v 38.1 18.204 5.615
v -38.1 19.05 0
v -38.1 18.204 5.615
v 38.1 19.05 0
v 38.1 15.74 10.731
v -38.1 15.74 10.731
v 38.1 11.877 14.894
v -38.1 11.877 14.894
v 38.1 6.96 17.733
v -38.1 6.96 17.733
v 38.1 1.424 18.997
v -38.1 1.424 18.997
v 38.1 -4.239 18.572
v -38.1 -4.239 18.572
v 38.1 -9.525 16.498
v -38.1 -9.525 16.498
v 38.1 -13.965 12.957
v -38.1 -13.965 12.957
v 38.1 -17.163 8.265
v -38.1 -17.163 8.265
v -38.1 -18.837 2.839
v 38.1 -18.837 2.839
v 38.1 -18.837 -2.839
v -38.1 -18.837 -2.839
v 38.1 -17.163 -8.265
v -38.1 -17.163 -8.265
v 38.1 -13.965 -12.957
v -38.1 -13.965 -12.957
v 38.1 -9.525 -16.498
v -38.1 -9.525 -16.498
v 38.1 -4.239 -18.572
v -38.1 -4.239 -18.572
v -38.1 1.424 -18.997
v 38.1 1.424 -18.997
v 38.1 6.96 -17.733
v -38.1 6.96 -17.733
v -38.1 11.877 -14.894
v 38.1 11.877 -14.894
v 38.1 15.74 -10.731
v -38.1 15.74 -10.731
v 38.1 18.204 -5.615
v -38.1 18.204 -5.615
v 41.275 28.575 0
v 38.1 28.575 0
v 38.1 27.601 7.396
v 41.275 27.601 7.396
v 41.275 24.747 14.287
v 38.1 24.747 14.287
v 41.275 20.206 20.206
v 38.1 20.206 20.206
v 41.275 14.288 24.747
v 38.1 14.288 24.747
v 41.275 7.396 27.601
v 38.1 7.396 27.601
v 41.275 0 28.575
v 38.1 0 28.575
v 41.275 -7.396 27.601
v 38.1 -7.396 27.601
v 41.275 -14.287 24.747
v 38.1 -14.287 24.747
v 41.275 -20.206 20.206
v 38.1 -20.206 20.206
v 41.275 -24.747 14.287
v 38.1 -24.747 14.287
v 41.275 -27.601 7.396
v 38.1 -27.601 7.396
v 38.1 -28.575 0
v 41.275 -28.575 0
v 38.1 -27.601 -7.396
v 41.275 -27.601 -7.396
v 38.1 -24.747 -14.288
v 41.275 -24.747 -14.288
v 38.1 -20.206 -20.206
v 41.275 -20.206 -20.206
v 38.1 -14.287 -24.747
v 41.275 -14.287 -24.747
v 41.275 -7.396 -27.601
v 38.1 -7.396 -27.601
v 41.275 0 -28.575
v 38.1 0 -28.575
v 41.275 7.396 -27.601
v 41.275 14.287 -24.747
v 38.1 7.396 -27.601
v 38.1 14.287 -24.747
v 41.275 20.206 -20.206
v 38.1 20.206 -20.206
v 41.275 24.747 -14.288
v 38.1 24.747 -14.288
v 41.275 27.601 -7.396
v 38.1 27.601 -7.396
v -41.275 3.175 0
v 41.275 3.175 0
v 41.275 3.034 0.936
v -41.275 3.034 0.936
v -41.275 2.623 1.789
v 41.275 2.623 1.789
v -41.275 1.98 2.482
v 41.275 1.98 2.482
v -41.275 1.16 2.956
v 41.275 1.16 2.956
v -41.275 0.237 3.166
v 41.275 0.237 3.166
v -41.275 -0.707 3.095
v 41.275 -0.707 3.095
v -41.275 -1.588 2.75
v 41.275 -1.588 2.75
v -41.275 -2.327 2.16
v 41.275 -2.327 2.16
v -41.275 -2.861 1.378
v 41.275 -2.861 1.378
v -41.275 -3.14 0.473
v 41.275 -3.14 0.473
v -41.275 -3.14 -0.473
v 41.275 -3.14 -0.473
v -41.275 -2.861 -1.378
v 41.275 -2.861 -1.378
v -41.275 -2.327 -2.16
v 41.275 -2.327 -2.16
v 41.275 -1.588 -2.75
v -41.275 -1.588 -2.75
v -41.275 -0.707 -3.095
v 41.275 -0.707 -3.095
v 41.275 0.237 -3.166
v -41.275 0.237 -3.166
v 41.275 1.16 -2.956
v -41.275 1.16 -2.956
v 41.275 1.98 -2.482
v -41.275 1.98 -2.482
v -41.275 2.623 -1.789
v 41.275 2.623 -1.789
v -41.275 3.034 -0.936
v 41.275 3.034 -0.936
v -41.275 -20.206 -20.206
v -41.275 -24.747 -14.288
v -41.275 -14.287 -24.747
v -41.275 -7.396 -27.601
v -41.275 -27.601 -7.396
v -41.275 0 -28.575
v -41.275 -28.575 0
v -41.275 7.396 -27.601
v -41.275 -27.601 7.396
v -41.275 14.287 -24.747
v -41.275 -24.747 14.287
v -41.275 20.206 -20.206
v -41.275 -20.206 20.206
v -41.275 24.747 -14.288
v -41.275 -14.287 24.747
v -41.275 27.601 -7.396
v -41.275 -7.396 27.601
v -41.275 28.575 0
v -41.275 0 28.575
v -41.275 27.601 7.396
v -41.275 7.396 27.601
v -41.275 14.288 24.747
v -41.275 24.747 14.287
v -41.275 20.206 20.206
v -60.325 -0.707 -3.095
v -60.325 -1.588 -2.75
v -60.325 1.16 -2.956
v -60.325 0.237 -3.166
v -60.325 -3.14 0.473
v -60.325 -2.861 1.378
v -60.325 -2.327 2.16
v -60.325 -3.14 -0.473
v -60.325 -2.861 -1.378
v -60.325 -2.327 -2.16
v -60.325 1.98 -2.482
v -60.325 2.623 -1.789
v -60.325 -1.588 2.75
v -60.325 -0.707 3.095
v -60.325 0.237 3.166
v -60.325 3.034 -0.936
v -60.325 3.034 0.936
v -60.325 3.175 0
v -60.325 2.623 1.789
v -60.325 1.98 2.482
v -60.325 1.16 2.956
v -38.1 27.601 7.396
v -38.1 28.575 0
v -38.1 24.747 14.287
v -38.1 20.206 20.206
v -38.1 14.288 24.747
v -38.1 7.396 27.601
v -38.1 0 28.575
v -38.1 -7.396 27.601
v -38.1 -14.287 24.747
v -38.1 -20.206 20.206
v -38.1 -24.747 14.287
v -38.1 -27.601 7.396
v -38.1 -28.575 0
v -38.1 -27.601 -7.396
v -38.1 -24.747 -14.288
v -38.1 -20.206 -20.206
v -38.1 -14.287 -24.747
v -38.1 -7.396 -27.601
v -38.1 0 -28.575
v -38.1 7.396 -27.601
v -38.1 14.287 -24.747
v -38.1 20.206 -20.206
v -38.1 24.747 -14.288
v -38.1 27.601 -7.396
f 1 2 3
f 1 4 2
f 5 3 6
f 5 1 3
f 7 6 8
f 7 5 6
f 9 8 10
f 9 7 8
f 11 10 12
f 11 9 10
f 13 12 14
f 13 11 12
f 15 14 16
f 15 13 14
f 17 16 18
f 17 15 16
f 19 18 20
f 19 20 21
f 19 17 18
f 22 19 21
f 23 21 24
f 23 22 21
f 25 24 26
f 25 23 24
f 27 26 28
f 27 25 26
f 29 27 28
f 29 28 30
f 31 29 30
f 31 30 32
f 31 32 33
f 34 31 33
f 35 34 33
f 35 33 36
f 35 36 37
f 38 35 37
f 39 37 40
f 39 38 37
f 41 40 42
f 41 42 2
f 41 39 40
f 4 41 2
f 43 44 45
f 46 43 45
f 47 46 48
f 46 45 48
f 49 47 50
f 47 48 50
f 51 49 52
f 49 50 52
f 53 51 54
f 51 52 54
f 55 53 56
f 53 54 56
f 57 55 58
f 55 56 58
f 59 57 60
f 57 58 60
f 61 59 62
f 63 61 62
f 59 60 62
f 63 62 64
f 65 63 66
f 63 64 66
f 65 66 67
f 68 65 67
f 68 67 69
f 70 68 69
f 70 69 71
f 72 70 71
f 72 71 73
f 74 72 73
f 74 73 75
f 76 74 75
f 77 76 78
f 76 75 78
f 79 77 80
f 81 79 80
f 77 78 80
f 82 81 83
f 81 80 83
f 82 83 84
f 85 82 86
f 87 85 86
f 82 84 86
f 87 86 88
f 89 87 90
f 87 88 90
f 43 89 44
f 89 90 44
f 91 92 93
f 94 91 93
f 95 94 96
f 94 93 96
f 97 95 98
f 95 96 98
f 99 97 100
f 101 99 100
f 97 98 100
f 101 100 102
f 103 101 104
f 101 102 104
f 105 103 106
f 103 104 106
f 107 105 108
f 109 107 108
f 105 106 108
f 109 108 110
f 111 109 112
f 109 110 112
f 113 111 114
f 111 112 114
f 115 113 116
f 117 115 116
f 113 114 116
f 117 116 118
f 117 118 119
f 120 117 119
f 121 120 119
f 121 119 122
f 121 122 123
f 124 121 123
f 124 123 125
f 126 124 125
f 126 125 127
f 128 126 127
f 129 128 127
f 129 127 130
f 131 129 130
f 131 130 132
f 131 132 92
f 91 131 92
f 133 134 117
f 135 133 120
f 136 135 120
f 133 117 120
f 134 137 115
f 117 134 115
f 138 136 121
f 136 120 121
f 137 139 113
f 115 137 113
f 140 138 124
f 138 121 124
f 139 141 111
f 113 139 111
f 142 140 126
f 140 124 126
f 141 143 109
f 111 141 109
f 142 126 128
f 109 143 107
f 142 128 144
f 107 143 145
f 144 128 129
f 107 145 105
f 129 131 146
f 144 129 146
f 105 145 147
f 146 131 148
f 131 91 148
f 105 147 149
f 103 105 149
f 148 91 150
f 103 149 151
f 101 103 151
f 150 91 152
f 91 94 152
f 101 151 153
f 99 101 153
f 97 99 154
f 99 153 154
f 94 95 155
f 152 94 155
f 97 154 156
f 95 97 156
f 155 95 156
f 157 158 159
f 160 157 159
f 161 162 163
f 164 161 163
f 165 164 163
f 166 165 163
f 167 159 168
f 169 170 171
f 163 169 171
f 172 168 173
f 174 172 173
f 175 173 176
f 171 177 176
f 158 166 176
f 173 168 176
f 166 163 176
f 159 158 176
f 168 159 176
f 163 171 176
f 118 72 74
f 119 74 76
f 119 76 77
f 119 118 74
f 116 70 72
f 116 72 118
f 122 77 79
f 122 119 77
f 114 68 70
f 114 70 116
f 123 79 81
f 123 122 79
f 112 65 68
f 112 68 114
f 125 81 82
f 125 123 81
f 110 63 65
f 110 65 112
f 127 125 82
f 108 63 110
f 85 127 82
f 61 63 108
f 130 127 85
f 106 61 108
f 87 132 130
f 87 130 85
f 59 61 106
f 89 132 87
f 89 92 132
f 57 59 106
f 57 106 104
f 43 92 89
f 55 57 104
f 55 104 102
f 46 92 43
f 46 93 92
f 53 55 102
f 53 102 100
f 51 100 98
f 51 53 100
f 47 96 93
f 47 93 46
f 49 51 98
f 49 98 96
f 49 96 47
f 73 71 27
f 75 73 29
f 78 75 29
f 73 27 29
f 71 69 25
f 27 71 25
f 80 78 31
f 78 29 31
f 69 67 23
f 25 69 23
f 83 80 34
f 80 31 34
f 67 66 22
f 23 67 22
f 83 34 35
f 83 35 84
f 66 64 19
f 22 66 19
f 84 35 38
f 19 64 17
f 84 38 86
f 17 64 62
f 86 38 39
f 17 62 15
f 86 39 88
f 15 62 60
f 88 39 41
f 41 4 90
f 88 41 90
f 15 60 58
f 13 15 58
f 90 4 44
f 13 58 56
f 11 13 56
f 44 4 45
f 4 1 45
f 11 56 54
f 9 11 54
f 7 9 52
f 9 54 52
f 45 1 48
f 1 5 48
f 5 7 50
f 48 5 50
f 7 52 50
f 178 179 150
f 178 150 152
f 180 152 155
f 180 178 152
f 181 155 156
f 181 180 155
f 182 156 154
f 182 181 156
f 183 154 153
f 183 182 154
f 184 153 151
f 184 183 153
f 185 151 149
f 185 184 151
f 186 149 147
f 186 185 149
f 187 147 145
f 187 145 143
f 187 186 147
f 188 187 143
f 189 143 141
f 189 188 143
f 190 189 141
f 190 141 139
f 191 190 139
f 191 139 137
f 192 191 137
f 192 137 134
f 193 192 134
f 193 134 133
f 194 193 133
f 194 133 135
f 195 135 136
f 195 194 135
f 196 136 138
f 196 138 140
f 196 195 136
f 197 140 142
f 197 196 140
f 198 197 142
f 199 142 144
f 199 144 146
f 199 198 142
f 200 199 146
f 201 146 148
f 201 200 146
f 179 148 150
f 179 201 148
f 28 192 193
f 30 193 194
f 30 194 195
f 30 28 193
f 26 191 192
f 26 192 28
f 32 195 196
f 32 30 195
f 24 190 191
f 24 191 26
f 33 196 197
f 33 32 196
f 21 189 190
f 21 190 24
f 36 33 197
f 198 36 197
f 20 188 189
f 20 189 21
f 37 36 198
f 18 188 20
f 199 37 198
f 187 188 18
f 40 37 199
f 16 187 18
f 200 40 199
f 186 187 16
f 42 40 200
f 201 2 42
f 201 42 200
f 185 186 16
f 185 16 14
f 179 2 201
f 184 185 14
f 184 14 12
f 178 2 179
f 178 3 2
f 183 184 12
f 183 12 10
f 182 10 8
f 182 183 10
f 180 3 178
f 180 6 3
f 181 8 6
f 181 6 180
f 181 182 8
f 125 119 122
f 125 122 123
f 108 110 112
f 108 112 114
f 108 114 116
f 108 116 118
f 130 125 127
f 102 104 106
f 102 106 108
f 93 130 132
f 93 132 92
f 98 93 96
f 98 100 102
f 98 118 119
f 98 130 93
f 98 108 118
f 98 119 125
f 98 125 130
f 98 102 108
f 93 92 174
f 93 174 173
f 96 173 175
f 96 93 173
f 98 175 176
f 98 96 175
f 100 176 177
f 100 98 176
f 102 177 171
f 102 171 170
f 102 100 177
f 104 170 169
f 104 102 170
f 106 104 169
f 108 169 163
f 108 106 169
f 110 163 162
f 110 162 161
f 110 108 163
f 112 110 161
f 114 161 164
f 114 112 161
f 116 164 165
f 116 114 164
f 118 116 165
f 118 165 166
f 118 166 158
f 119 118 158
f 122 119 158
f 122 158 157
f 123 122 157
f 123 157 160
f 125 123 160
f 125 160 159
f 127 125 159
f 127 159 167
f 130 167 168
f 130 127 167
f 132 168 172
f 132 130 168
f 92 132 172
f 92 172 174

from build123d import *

# Parameters (mm, degrees)
F0_R     = 19.05
F1_DEPTH = 38.1
F2_R     = 28.575
F3_DEPTH = 3.175
F5_R     = 3.175
F6_DEPTH = 101.6


with BuildPart() as f1:
    # F0 (on Right) → F1 (new body)
    with BuildSketch(Plane.YZ):
        Circle(F0_R)
    extrude(amount=F1_DEPTH)

    # F2 (on face) → F3 (join)
    with BuildSketch(Plane.YZ.offset(38.1)):
        Circle(F2_R)
    extrude(amount=F3_DEPTH)

    # F4: F1 across plane


with BuildPart() as f1_1:
    add(f1.part)
    add(f1.part.mirror(Plane.YZ))


with BuildPart() as f6:
    # F5 (on face) → F6 (new body)
    with BuildSketch(Plane.YZ.offset(41.275)):
        Circle(F5_R)
    extrude(amount=-F6_DEPTH)


with BuildPart() as f1_2:
    add(f1_1.part)

    # F7: cut F6
    add(f6.part, mode=Mode.SUBTRACT)


solid = Compound([f6.part, f1_2.part])
